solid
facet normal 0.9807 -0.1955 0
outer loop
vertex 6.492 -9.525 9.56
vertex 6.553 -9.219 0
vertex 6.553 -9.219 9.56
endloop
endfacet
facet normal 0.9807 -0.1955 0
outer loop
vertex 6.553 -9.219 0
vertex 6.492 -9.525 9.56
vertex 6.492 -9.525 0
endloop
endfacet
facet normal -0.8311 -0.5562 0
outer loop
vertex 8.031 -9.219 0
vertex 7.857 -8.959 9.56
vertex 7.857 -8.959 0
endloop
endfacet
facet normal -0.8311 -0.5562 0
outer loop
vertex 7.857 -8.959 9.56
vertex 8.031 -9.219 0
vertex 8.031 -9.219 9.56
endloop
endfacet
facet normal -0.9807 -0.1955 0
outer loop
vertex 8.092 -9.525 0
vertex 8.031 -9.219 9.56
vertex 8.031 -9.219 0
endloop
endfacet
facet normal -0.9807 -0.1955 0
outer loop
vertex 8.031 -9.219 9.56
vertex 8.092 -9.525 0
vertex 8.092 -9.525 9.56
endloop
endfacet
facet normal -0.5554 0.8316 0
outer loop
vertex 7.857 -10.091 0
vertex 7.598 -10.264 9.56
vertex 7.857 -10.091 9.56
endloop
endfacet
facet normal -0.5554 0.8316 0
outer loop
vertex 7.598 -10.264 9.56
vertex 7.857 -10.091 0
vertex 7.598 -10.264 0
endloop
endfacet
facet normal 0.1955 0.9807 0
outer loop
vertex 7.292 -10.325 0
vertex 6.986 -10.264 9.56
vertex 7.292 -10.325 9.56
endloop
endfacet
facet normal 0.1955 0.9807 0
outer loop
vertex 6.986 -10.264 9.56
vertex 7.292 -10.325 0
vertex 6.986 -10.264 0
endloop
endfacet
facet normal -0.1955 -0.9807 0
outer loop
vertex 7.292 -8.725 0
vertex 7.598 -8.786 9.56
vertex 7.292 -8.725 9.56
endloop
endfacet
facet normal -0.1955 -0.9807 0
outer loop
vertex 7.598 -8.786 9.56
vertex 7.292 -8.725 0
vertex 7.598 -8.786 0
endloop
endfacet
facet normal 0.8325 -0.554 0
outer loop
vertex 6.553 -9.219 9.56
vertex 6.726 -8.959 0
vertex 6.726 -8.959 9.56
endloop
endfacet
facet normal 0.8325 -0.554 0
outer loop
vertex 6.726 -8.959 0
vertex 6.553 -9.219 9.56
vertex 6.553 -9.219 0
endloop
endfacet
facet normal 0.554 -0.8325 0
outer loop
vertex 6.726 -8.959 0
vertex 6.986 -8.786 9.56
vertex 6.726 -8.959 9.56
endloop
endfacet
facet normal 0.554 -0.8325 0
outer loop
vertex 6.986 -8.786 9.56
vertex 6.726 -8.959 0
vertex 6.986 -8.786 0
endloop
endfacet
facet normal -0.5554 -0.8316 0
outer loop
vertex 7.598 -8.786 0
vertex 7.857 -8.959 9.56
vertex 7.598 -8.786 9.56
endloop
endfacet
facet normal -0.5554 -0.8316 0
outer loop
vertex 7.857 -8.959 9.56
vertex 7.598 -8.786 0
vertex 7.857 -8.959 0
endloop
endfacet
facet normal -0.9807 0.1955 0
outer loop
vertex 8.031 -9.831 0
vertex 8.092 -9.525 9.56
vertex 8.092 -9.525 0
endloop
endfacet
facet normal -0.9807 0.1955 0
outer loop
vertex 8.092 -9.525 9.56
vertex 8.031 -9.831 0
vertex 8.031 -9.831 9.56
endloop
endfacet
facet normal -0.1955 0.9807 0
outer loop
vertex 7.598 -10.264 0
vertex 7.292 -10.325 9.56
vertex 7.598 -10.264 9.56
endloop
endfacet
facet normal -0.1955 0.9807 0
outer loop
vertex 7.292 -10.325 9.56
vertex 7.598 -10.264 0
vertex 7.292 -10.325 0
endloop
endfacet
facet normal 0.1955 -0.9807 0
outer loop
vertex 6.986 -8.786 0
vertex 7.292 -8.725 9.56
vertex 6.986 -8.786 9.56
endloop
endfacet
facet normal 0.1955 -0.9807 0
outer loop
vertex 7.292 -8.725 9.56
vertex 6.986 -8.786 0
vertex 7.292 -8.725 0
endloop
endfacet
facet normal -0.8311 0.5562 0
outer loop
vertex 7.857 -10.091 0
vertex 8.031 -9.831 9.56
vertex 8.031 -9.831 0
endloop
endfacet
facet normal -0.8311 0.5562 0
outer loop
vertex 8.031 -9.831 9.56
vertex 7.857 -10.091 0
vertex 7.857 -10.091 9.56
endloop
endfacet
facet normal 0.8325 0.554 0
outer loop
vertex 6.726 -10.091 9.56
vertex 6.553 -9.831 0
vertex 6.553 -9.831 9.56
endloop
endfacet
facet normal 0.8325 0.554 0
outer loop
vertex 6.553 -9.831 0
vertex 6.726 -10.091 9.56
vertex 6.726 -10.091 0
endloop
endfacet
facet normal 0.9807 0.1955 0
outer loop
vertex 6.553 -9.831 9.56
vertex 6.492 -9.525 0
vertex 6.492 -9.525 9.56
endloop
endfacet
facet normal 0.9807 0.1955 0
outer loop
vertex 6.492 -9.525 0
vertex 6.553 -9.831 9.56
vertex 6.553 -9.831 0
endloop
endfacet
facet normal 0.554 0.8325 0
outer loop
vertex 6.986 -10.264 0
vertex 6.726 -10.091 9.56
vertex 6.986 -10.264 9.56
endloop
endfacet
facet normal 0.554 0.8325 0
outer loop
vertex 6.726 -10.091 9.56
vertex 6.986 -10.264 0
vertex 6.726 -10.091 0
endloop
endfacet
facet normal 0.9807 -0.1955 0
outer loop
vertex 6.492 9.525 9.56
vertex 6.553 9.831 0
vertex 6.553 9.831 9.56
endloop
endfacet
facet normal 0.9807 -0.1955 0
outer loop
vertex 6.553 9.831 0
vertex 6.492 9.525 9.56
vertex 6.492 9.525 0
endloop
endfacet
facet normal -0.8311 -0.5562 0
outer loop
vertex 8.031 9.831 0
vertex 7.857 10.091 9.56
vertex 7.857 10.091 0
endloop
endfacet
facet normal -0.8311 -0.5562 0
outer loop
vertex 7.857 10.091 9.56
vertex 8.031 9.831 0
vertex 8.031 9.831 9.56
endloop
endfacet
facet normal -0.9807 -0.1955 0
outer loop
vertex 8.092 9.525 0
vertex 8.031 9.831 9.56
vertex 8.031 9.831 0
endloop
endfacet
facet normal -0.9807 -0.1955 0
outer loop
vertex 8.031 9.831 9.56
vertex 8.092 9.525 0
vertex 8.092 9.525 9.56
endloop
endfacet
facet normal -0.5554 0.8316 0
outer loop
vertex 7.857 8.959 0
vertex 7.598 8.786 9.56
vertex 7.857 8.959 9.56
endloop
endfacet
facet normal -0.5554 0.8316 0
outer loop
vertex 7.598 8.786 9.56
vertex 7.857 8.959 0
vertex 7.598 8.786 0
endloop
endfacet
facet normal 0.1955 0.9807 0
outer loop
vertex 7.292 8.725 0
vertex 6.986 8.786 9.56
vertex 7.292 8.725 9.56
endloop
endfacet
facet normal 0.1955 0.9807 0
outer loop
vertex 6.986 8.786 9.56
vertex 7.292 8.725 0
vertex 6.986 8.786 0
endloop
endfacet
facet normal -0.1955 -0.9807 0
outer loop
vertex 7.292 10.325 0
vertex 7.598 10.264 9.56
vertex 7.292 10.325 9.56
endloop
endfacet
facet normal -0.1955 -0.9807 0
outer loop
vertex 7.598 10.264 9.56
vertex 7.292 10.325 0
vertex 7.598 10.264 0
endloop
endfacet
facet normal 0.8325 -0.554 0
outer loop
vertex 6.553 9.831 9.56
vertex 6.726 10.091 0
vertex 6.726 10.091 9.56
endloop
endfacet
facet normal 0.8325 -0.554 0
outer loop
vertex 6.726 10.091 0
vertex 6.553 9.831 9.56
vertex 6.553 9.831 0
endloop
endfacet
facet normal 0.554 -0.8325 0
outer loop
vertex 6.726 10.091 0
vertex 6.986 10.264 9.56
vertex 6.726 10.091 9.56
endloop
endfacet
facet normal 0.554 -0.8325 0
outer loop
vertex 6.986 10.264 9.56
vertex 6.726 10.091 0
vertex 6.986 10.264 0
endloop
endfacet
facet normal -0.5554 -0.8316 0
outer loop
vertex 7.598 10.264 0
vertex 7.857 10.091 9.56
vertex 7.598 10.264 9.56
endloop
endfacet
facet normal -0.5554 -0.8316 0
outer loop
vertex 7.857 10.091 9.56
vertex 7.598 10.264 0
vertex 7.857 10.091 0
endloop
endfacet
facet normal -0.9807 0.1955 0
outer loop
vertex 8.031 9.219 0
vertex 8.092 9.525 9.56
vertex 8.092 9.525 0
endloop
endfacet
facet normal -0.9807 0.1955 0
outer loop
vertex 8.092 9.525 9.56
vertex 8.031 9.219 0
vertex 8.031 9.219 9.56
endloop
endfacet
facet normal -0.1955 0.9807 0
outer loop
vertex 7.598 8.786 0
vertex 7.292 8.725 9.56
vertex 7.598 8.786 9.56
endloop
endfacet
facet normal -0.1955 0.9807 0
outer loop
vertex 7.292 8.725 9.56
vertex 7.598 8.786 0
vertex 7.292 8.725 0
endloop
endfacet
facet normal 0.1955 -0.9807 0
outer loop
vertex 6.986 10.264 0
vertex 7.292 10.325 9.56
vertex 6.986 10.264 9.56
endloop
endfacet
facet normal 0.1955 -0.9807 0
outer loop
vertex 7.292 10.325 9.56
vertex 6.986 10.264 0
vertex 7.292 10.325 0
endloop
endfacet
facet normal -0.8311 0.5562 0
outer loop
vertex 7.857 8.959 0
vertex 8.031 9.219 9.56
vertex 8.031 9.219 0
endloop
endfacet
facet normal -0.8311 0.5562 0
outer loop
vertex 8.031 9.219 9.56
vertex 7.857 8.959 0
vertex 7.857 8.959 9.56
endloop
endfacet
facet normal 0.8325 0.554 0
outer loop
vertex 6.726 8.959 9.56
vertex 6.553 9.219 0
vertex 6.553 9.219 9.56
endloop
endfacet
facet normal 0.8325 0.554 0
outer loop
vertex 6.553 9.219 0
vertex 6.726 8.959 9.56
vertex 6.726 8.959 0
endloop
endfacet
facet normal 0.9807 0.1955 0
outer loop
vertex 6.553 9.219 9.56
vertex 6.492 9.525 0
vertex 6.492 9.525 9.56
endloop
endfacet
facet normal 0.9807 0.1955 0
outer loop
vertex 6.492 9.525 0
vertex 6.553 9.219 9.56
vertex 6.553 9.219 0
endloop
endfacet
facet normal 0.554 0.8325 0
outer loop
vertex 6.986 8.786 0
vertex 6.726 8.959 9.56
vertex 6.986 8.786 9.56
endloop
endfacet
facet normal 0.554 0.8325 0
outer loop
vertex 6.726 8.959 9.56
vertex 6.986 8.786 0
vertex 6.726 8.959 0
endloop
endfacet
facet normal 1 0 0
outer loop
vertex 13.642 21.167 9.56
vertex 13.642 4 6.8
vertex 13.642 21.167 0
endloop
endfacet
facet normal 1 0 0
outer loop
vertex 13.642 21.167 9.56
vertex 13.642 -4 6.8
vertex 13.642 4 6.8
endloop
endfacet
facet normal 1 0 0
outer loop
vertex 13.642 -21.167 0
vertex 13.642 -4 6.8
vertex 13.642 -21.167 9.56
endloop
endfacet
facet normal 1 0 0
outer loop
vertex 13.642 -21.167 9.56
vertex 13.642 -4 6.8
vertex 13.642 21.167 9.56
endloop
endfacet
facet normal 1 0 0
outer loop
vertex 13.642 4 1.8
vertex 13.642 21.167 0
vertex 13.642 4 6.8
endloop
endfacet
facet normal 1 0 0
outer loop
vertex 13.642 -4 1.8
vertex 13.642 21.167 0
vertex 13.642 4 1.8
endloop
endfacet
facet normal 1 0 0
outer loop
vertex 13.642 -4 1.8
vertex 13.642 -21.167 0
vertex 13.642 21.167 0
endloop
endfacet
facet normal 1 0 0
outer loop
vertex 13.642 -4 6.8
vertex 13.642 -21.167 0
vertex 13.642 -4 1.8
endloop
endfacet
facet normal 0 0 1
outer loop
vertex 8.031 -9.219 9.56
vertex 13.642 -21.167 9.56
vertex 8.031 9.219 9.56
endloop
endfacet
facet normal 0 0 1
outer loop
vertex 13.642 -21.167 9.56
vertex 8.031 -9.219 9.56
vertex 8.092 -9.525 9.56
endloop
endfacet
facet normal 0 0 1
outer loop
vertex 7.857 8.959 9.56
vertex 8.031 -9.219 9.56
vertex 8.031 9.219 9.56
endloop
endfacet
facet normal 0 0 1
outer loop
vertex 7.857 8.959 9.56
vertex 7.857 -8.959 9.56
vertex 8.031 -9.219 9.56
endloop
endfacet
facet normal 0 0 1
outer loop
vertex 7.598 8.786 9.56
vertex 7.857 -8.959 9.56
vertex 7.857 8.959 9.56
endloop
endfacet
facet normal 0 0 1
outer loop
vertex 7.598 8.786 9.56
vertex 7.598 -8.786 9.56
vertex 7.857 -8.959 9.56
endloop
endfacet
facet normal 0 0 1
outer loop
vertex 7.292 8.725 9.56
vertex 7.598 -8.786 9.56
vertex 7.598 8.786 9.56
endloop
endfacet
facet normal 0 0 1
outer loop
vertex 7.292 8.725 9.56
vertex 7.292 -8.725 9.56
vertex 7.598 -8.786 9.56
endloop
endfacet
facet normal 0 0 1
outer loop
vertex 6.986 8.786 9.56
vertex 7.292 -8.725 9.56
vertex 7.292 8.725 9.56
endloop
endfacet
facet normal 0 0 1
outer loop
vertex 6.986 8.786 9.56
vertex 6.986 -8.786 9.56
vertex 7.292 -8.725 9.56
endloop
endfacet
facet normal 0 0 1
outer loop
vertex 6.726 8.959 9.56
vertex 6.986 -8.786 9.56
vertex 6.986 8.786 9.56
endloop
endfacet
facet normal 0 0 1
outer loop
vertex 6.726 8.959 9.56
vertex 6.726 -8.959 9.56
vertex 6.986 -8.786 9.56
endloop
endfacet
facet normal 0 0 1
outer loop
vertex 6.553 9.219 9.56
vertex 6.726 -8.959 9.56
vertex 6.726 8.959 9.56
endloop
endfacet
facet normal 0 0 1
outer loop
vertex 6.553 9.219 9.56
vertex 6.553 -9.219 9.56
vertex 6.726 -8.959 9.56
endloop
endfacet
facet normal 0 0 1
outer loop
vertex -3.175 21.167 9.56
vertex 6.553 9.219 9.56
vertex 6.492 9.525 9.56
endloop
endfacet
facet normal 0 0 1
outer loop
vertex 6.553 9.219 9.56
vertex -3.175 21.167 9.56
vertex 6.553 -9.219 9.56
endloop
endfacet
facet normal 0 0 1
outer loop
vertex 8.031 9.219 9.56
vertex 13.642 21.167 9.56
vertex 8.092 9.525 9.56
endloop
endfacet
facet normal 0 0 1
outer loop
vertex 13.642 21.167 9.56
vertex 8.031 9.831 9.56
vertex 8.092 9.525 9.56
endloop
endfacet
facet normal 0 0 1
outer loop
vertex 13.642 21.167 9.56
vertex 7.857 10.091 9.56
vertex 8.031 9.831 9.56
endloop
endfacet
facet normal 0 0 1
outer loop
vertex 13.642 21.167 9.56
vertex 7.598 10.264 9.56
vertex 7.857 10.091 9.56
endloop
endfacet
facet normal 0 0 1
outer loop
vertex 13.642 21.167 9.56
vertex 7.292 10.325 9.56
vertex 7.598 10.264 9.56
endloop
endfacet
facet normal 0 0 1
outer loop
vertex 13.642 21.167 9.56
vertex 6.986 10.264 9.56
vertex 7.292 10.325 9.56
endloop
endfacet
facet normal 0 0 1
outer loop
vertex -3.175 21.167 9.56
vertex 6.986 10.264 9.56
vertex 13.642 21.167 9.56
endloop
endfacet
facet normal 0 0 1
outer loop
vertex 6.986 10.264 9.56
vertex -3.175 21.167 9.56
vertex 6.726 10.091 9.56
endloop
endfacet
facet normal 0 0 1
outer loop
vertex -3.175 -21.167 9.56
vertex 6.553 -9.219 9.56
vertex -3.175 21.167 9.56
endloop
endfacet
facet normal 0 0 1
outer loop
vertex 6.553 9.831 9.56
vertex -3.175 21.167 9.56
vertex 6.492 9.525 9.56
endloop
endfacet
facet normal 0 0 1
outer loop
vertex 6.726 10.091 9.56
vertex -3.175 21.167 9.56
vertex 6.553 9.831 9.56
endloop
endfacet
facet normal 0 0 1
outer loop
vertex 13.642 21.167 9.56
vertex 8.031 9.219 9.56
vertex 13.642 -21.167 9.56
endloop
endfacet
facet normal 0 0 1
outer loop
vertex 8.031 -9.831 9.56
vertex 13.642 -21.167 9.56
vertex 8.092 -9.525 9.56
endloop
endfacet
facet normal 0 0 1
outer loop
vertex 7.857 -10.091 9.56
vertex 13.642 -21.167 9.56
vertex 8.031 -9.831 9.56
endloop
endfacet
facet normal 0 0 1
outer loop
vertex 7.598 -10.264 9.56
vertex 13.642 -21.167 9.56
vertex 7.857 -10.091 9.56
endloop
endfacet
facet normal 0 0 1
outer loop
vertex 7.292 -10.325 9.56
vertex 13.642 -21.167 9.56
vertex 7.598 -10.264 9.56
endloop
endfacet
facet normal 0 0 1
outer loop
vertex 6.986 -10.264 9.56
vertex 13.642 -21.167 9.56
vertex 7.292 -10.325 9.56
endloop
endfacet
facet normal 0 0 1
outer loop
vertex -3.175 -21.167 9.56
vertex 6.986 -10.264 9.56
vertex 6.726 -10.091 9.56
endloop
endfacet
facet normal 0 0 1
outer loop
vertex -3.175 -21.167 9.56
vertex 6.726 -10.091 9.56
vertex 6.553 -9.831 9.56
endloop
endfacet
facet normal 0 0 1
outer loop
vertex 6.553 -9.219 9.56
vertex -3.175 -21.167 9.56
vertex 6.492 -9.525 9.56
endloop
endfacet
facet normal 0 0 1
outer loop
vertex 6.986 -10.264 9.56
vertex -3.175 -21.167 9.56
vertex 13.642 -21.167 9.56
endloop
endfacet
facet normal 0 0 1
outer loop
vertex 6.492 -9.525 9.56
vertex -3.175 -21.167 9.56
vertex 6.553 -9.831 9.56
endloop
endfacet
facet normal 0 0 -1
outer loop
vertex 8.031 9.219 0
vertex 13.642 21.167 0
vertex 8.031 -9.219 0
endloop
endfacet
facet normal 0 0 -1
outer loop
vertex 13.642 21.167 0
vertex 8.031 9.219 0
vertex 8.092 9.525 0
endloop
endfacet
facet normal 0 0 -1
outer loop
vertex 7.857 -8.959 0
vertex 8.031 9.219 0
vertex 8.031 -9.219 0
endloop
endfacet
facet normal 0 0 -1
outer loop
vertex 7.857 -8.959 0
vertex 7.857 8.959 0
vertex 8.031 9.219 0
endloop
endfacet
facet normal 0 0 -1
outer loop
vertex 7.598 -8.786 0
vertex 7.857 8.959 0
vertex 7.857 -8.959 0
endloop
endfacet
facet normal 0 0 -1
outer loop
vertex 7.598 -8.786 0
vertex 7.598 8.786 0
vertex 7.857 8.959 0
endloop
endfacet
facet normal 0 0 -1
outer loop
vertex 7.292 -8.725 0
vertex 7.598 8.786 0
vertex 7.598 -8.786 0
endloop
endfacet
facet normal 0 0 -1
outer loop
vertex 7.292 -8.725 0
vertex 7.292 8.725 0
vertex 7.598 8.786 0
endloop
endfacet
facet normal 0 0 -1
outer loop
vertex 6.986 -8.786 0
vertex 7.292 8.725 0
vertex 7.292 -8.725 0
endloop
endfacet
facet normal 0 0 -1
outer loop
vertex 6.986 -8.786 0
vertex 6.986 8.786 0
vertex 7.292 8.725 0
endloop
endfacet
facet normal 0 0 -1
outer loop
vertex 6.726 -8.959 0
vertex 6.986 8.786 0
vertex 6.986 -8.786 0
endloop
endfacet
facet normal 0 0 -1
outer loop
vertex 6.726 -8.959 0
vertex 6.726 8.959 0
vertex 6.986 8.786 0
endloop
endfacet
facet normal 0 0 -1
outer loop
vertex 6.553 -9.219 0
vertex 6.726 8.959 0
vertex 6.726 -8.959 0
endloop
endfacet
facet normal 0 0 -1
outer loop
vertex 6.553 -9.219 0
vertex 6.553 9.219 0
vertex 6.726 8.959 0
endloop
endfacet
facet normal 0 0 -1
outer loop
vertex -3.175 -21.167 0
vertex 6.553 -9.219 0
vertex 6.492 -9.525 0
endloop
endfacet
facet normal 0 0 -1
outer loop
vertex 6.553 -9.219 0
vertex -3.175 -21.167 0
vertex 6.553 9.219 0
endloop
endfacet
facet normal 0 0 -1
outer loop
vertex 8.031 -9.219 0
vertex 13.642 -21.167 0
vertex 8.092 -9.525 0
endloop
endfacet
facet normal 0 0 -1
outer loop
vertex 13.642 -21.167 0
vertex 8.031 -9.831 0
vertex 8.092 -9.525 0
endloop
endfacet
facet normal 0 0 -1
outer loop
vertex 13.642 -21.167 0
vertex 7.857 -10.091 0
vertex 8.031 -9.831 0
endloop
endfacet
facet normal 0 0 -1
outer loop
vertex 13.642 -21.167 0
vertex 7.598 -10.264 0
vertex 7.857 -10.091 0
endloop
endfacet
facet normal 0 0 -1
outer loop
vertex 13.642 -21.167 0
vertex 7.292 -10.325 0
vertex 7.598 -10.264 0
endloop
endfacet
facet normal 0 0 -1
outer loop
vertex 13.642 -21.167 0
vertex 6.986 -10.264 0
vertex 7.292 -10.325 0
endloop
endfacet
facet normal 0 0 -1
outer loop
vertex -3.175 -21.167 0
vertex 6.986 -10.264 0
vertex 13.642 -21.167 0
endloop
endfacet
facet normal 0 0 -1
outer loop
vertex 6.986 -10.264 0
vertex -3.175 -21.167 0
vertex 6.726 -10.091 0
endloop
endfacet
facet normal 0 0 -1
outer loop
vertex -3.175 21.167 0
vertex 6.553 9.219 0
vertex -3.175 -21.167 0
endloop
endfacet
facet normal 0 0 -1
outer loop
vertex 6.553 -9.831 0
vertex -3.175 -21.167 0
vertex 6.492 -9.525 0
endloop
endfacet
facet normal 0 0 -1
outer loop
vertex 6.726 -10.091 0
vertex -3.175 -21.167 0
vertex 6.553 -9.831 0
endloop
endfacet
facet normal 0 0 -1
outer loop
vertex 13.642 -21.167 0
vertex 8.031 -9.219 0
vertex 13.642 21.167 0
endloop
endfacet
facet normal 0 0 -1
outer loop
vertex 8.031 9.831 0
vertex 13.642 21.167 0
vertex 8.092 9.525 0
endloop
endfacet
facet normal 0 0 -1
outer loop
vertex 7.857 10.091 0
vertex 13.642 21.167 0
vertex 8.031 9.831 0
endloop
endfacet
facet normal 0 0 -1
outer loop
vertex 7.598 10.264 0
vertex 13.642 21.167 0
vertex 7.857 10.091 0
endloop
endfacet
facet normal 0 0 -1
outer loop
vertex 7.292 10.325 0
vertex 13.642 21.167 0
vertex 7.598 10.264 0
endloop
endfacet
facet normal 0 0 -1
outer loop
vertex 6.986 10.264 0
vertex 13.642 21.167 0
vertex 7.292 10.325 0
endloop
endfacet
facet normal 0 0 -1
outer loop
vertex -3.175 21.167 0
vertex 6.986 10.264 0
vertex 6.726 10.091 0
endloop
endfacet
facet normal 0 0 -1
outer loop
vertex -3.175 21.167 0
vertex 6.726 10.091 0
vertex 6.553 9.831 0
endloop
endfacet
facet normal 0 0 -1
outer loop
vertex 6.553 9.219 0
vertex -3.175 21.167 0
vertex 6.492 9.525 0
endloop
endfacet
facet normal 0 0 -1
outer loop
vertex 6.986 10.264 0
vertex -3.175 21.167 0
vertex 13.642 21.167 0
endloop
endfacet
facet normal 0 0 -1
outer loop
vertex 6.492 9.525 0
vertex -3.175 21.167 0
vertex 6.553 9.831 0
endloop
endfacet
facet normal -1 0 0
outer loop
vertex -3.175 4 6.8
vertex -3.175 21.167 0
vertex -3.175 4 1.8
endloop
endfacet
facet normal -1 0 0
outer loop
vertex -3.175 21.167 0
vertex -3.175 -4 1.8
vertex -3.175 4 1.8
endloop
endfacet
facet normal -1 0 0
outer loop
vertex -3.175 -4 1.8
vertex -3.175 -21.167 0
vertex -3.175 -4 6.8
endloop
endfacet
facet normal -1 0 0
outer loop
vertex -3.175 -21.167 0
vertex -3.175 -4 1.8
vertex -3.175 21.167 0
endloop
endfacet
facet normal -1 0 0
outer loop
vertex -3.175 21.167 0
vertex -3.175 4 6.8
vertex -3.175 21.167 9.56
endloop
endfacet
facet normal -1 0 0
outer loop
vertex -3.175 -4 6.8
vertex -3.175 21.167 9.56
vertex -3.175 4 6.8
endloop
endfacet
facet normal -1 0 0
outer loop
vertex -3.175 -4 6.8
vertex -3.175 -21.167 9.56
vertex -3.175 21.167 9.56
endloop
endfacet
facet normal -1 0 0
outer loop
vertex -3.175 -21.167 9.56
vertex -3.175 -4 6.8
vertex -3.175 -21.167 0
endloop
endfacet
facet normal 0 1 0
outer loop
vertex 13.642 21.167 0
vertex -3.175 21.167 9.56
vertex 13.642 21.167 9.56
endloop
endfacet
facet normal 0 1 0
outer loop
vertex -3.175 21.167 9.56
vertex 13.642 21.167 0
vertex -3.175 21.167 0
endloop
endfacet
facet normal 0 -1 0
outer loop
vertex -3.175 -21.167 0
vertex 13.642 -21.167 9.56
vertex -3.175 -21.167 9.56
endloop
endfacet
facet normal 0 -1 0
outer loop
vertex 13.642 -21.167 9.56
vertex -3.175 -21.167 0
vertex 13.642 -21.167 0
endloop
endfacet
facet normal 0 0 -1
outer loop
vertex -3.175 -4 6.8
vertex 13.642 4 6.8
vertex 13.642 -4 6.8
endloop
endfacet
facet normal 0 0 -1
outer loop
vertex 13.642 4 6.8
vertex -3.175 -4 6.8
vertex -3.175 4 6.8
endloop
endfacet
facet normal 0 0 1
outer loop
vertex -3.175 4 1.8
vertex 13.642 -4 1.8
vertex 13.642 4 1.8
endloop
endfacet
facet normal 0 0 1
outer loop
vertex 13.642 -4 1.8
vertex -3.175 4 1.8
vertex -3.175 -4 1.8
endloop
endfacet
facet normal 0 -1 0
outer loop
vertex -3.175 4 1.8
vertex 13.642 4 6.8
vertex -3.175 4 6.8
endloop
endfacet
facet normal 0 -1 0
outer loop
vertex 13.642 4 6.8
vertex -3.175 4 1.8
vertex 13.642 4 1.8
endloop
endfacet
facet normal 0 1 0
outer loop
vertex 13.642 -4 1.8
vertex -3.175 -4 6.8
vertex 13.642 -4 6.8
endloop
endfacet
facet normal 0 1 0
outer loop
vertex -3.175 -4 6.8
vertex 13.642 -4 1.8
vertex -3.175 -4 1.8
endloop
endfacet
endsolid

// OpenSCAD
// file: ../../library/e7_all.scad
// ==========================================================================
//  e7_all.scad - include this one file. Preview, print plates and the report.
// ==========================================================================
include <e7_params.scad>
include <e7_body.scad>

// whole painted loco
module e7_preview() {
  // carbody in its paint bands
  for (i = [0:len(PAINT_BANDS) - 1]) {
    z0 = i == 0 ? -1 : p(PAINT_BANDS[i - 1][0]);
    z1 = i == len(PAINT_BANDS) - 1 ? 1000 : p(PAINT_BANDS[i][0]);
    color(PAINT_BANDS[i][1]) render(convexity = 8) e7_shell_solid([z0, z1]);
  }
  color(C_GLASS) e7_glass();
  color(C_LENS) let (d = nose_d_at_z(HEADLIGHT[0]))
    translate([XF - p(d) + p(HEADLIGHT[2]) + p(1.5), 0, p(HEADLIGHT[0])]) rotate([0, 90, 0]) cylinder(d = p(HEADLIGHT[1]) - 0.8, h = 0.5, $fn = 32);
  color(C_FRAME) { for (j = [1:NFRAME]) e7_frame_piece(j); e7_pilot(); e7_pilot_rear(); }
  for (tx = [TRK_X, -TRK_X]) translate([tx, 0, 0]) { color(C_TRUCK) e7_truck_frame(); color(C_WHEEL) e7_wheels(); }
}
// thin glass panes sitting in the window pockets (preview only)
module e7_glass() {
  intersection() { e7_loft(DET * 0.6); union() { e7_windshield_cut(); e7_side_cuts_windows_only(); } }
}
module e7_side_cuts_windows_only() {
  for (s = [-1, 1], w = CAB_WIN)
    translate([XF - p(w[1]), s * HW - (s > 0 ? DET : 3 - DET), p(w[2])]) cube([p(w[1] - w[0]), 3, p(w[3] - w[2])]);
}

// one print, laid out for the printer
module e7_plate(part) {
  sec = [for (k = [1:NSEC]) str("body_", k)];
  frm = [for (j = [1:NFRAME]) str("frame_", j)];
  if (is_num(search([part], sec)[0])) {
    k = search([part], sec)[0] + 1;
    // stand the section on its open bottom (skirt edge on the bed)
    translate([-sec_x0(k) - SEC_L / 2, 0, -Z_SKIRT]) e7_body_section(k);
  } else if (is_num(search([part], frm)[0])) {
    j = search([part], frm)[0] + 1;
    xs = concat([FRAME_X0], FRAME_SPLITS, [FRAME_X1]);
    translate([-(xs[j - 1] + xs[j]) / 2, 0, -Z_FRAME_BOT]) e7_frame_piece(j);
  } else if (part == "pilot") {
    translate([-XF, 0, 0]) rotate([0, 0, 0]) translate([0, 0, -p(5)]) e7_pilot();
  } else if (part == "pilot_rear") {
    translate([-XR, 0, 0]) translate([0, 0, -(CPL_Z - CPL_H / 2 - WALL)]) e7_pilot_rear();
  } else if (part == "truck") {
    // upside down, bolster on the bed
    translate([0, 0, Z_FRAME_BOT - 0.3]) rotate([180, 0, 0]) e7_truck_frame();
  } else {
    assert(false, str("unknown part '", part, "'"));
  }
}

module e7_report() {
  echo(str("MILW E7A ", ROAD_NO, " class ", CLASS, " - ", SC, " scale 1:", RATIO, ", paint ", PAINT));
  echo(str("  carbody ", round(BL), " mm long, ", round(2 * HW), " mm wide, roof ", round(Z_ROOF), " mm, cab ", round(Z_CAB), " mm above rail"));
  echo(str("  ", NSEC, " body sections of ", round(SEC_L), " mm; ", NFRAME, " frame pieces; trucks at +/- ", round(TRK_X), " mm"));
  echo(str("  body screws ", SCREW_BODY_NAME, " x ", 2 * len(BOSS_X), "; truck pivots ", PIVOT[1], "; wheels ", round(WHEEL_D * 10) / 10, " mm (bought)"));
}
// main file
// Milwaukee Road E7A, O scale 1-48 - print 7 of 8: pilot_rear - rear coupler pocket block
// Render (F6), export STL, print. Settings: ../../library/e7_params.scad
// Whole loco preview and notes: ../../MILW_E7_Main.scad
SCALE_SEL = "O";
include <../../library/e7_all.scad>
e7_plate("pilot_rear");
